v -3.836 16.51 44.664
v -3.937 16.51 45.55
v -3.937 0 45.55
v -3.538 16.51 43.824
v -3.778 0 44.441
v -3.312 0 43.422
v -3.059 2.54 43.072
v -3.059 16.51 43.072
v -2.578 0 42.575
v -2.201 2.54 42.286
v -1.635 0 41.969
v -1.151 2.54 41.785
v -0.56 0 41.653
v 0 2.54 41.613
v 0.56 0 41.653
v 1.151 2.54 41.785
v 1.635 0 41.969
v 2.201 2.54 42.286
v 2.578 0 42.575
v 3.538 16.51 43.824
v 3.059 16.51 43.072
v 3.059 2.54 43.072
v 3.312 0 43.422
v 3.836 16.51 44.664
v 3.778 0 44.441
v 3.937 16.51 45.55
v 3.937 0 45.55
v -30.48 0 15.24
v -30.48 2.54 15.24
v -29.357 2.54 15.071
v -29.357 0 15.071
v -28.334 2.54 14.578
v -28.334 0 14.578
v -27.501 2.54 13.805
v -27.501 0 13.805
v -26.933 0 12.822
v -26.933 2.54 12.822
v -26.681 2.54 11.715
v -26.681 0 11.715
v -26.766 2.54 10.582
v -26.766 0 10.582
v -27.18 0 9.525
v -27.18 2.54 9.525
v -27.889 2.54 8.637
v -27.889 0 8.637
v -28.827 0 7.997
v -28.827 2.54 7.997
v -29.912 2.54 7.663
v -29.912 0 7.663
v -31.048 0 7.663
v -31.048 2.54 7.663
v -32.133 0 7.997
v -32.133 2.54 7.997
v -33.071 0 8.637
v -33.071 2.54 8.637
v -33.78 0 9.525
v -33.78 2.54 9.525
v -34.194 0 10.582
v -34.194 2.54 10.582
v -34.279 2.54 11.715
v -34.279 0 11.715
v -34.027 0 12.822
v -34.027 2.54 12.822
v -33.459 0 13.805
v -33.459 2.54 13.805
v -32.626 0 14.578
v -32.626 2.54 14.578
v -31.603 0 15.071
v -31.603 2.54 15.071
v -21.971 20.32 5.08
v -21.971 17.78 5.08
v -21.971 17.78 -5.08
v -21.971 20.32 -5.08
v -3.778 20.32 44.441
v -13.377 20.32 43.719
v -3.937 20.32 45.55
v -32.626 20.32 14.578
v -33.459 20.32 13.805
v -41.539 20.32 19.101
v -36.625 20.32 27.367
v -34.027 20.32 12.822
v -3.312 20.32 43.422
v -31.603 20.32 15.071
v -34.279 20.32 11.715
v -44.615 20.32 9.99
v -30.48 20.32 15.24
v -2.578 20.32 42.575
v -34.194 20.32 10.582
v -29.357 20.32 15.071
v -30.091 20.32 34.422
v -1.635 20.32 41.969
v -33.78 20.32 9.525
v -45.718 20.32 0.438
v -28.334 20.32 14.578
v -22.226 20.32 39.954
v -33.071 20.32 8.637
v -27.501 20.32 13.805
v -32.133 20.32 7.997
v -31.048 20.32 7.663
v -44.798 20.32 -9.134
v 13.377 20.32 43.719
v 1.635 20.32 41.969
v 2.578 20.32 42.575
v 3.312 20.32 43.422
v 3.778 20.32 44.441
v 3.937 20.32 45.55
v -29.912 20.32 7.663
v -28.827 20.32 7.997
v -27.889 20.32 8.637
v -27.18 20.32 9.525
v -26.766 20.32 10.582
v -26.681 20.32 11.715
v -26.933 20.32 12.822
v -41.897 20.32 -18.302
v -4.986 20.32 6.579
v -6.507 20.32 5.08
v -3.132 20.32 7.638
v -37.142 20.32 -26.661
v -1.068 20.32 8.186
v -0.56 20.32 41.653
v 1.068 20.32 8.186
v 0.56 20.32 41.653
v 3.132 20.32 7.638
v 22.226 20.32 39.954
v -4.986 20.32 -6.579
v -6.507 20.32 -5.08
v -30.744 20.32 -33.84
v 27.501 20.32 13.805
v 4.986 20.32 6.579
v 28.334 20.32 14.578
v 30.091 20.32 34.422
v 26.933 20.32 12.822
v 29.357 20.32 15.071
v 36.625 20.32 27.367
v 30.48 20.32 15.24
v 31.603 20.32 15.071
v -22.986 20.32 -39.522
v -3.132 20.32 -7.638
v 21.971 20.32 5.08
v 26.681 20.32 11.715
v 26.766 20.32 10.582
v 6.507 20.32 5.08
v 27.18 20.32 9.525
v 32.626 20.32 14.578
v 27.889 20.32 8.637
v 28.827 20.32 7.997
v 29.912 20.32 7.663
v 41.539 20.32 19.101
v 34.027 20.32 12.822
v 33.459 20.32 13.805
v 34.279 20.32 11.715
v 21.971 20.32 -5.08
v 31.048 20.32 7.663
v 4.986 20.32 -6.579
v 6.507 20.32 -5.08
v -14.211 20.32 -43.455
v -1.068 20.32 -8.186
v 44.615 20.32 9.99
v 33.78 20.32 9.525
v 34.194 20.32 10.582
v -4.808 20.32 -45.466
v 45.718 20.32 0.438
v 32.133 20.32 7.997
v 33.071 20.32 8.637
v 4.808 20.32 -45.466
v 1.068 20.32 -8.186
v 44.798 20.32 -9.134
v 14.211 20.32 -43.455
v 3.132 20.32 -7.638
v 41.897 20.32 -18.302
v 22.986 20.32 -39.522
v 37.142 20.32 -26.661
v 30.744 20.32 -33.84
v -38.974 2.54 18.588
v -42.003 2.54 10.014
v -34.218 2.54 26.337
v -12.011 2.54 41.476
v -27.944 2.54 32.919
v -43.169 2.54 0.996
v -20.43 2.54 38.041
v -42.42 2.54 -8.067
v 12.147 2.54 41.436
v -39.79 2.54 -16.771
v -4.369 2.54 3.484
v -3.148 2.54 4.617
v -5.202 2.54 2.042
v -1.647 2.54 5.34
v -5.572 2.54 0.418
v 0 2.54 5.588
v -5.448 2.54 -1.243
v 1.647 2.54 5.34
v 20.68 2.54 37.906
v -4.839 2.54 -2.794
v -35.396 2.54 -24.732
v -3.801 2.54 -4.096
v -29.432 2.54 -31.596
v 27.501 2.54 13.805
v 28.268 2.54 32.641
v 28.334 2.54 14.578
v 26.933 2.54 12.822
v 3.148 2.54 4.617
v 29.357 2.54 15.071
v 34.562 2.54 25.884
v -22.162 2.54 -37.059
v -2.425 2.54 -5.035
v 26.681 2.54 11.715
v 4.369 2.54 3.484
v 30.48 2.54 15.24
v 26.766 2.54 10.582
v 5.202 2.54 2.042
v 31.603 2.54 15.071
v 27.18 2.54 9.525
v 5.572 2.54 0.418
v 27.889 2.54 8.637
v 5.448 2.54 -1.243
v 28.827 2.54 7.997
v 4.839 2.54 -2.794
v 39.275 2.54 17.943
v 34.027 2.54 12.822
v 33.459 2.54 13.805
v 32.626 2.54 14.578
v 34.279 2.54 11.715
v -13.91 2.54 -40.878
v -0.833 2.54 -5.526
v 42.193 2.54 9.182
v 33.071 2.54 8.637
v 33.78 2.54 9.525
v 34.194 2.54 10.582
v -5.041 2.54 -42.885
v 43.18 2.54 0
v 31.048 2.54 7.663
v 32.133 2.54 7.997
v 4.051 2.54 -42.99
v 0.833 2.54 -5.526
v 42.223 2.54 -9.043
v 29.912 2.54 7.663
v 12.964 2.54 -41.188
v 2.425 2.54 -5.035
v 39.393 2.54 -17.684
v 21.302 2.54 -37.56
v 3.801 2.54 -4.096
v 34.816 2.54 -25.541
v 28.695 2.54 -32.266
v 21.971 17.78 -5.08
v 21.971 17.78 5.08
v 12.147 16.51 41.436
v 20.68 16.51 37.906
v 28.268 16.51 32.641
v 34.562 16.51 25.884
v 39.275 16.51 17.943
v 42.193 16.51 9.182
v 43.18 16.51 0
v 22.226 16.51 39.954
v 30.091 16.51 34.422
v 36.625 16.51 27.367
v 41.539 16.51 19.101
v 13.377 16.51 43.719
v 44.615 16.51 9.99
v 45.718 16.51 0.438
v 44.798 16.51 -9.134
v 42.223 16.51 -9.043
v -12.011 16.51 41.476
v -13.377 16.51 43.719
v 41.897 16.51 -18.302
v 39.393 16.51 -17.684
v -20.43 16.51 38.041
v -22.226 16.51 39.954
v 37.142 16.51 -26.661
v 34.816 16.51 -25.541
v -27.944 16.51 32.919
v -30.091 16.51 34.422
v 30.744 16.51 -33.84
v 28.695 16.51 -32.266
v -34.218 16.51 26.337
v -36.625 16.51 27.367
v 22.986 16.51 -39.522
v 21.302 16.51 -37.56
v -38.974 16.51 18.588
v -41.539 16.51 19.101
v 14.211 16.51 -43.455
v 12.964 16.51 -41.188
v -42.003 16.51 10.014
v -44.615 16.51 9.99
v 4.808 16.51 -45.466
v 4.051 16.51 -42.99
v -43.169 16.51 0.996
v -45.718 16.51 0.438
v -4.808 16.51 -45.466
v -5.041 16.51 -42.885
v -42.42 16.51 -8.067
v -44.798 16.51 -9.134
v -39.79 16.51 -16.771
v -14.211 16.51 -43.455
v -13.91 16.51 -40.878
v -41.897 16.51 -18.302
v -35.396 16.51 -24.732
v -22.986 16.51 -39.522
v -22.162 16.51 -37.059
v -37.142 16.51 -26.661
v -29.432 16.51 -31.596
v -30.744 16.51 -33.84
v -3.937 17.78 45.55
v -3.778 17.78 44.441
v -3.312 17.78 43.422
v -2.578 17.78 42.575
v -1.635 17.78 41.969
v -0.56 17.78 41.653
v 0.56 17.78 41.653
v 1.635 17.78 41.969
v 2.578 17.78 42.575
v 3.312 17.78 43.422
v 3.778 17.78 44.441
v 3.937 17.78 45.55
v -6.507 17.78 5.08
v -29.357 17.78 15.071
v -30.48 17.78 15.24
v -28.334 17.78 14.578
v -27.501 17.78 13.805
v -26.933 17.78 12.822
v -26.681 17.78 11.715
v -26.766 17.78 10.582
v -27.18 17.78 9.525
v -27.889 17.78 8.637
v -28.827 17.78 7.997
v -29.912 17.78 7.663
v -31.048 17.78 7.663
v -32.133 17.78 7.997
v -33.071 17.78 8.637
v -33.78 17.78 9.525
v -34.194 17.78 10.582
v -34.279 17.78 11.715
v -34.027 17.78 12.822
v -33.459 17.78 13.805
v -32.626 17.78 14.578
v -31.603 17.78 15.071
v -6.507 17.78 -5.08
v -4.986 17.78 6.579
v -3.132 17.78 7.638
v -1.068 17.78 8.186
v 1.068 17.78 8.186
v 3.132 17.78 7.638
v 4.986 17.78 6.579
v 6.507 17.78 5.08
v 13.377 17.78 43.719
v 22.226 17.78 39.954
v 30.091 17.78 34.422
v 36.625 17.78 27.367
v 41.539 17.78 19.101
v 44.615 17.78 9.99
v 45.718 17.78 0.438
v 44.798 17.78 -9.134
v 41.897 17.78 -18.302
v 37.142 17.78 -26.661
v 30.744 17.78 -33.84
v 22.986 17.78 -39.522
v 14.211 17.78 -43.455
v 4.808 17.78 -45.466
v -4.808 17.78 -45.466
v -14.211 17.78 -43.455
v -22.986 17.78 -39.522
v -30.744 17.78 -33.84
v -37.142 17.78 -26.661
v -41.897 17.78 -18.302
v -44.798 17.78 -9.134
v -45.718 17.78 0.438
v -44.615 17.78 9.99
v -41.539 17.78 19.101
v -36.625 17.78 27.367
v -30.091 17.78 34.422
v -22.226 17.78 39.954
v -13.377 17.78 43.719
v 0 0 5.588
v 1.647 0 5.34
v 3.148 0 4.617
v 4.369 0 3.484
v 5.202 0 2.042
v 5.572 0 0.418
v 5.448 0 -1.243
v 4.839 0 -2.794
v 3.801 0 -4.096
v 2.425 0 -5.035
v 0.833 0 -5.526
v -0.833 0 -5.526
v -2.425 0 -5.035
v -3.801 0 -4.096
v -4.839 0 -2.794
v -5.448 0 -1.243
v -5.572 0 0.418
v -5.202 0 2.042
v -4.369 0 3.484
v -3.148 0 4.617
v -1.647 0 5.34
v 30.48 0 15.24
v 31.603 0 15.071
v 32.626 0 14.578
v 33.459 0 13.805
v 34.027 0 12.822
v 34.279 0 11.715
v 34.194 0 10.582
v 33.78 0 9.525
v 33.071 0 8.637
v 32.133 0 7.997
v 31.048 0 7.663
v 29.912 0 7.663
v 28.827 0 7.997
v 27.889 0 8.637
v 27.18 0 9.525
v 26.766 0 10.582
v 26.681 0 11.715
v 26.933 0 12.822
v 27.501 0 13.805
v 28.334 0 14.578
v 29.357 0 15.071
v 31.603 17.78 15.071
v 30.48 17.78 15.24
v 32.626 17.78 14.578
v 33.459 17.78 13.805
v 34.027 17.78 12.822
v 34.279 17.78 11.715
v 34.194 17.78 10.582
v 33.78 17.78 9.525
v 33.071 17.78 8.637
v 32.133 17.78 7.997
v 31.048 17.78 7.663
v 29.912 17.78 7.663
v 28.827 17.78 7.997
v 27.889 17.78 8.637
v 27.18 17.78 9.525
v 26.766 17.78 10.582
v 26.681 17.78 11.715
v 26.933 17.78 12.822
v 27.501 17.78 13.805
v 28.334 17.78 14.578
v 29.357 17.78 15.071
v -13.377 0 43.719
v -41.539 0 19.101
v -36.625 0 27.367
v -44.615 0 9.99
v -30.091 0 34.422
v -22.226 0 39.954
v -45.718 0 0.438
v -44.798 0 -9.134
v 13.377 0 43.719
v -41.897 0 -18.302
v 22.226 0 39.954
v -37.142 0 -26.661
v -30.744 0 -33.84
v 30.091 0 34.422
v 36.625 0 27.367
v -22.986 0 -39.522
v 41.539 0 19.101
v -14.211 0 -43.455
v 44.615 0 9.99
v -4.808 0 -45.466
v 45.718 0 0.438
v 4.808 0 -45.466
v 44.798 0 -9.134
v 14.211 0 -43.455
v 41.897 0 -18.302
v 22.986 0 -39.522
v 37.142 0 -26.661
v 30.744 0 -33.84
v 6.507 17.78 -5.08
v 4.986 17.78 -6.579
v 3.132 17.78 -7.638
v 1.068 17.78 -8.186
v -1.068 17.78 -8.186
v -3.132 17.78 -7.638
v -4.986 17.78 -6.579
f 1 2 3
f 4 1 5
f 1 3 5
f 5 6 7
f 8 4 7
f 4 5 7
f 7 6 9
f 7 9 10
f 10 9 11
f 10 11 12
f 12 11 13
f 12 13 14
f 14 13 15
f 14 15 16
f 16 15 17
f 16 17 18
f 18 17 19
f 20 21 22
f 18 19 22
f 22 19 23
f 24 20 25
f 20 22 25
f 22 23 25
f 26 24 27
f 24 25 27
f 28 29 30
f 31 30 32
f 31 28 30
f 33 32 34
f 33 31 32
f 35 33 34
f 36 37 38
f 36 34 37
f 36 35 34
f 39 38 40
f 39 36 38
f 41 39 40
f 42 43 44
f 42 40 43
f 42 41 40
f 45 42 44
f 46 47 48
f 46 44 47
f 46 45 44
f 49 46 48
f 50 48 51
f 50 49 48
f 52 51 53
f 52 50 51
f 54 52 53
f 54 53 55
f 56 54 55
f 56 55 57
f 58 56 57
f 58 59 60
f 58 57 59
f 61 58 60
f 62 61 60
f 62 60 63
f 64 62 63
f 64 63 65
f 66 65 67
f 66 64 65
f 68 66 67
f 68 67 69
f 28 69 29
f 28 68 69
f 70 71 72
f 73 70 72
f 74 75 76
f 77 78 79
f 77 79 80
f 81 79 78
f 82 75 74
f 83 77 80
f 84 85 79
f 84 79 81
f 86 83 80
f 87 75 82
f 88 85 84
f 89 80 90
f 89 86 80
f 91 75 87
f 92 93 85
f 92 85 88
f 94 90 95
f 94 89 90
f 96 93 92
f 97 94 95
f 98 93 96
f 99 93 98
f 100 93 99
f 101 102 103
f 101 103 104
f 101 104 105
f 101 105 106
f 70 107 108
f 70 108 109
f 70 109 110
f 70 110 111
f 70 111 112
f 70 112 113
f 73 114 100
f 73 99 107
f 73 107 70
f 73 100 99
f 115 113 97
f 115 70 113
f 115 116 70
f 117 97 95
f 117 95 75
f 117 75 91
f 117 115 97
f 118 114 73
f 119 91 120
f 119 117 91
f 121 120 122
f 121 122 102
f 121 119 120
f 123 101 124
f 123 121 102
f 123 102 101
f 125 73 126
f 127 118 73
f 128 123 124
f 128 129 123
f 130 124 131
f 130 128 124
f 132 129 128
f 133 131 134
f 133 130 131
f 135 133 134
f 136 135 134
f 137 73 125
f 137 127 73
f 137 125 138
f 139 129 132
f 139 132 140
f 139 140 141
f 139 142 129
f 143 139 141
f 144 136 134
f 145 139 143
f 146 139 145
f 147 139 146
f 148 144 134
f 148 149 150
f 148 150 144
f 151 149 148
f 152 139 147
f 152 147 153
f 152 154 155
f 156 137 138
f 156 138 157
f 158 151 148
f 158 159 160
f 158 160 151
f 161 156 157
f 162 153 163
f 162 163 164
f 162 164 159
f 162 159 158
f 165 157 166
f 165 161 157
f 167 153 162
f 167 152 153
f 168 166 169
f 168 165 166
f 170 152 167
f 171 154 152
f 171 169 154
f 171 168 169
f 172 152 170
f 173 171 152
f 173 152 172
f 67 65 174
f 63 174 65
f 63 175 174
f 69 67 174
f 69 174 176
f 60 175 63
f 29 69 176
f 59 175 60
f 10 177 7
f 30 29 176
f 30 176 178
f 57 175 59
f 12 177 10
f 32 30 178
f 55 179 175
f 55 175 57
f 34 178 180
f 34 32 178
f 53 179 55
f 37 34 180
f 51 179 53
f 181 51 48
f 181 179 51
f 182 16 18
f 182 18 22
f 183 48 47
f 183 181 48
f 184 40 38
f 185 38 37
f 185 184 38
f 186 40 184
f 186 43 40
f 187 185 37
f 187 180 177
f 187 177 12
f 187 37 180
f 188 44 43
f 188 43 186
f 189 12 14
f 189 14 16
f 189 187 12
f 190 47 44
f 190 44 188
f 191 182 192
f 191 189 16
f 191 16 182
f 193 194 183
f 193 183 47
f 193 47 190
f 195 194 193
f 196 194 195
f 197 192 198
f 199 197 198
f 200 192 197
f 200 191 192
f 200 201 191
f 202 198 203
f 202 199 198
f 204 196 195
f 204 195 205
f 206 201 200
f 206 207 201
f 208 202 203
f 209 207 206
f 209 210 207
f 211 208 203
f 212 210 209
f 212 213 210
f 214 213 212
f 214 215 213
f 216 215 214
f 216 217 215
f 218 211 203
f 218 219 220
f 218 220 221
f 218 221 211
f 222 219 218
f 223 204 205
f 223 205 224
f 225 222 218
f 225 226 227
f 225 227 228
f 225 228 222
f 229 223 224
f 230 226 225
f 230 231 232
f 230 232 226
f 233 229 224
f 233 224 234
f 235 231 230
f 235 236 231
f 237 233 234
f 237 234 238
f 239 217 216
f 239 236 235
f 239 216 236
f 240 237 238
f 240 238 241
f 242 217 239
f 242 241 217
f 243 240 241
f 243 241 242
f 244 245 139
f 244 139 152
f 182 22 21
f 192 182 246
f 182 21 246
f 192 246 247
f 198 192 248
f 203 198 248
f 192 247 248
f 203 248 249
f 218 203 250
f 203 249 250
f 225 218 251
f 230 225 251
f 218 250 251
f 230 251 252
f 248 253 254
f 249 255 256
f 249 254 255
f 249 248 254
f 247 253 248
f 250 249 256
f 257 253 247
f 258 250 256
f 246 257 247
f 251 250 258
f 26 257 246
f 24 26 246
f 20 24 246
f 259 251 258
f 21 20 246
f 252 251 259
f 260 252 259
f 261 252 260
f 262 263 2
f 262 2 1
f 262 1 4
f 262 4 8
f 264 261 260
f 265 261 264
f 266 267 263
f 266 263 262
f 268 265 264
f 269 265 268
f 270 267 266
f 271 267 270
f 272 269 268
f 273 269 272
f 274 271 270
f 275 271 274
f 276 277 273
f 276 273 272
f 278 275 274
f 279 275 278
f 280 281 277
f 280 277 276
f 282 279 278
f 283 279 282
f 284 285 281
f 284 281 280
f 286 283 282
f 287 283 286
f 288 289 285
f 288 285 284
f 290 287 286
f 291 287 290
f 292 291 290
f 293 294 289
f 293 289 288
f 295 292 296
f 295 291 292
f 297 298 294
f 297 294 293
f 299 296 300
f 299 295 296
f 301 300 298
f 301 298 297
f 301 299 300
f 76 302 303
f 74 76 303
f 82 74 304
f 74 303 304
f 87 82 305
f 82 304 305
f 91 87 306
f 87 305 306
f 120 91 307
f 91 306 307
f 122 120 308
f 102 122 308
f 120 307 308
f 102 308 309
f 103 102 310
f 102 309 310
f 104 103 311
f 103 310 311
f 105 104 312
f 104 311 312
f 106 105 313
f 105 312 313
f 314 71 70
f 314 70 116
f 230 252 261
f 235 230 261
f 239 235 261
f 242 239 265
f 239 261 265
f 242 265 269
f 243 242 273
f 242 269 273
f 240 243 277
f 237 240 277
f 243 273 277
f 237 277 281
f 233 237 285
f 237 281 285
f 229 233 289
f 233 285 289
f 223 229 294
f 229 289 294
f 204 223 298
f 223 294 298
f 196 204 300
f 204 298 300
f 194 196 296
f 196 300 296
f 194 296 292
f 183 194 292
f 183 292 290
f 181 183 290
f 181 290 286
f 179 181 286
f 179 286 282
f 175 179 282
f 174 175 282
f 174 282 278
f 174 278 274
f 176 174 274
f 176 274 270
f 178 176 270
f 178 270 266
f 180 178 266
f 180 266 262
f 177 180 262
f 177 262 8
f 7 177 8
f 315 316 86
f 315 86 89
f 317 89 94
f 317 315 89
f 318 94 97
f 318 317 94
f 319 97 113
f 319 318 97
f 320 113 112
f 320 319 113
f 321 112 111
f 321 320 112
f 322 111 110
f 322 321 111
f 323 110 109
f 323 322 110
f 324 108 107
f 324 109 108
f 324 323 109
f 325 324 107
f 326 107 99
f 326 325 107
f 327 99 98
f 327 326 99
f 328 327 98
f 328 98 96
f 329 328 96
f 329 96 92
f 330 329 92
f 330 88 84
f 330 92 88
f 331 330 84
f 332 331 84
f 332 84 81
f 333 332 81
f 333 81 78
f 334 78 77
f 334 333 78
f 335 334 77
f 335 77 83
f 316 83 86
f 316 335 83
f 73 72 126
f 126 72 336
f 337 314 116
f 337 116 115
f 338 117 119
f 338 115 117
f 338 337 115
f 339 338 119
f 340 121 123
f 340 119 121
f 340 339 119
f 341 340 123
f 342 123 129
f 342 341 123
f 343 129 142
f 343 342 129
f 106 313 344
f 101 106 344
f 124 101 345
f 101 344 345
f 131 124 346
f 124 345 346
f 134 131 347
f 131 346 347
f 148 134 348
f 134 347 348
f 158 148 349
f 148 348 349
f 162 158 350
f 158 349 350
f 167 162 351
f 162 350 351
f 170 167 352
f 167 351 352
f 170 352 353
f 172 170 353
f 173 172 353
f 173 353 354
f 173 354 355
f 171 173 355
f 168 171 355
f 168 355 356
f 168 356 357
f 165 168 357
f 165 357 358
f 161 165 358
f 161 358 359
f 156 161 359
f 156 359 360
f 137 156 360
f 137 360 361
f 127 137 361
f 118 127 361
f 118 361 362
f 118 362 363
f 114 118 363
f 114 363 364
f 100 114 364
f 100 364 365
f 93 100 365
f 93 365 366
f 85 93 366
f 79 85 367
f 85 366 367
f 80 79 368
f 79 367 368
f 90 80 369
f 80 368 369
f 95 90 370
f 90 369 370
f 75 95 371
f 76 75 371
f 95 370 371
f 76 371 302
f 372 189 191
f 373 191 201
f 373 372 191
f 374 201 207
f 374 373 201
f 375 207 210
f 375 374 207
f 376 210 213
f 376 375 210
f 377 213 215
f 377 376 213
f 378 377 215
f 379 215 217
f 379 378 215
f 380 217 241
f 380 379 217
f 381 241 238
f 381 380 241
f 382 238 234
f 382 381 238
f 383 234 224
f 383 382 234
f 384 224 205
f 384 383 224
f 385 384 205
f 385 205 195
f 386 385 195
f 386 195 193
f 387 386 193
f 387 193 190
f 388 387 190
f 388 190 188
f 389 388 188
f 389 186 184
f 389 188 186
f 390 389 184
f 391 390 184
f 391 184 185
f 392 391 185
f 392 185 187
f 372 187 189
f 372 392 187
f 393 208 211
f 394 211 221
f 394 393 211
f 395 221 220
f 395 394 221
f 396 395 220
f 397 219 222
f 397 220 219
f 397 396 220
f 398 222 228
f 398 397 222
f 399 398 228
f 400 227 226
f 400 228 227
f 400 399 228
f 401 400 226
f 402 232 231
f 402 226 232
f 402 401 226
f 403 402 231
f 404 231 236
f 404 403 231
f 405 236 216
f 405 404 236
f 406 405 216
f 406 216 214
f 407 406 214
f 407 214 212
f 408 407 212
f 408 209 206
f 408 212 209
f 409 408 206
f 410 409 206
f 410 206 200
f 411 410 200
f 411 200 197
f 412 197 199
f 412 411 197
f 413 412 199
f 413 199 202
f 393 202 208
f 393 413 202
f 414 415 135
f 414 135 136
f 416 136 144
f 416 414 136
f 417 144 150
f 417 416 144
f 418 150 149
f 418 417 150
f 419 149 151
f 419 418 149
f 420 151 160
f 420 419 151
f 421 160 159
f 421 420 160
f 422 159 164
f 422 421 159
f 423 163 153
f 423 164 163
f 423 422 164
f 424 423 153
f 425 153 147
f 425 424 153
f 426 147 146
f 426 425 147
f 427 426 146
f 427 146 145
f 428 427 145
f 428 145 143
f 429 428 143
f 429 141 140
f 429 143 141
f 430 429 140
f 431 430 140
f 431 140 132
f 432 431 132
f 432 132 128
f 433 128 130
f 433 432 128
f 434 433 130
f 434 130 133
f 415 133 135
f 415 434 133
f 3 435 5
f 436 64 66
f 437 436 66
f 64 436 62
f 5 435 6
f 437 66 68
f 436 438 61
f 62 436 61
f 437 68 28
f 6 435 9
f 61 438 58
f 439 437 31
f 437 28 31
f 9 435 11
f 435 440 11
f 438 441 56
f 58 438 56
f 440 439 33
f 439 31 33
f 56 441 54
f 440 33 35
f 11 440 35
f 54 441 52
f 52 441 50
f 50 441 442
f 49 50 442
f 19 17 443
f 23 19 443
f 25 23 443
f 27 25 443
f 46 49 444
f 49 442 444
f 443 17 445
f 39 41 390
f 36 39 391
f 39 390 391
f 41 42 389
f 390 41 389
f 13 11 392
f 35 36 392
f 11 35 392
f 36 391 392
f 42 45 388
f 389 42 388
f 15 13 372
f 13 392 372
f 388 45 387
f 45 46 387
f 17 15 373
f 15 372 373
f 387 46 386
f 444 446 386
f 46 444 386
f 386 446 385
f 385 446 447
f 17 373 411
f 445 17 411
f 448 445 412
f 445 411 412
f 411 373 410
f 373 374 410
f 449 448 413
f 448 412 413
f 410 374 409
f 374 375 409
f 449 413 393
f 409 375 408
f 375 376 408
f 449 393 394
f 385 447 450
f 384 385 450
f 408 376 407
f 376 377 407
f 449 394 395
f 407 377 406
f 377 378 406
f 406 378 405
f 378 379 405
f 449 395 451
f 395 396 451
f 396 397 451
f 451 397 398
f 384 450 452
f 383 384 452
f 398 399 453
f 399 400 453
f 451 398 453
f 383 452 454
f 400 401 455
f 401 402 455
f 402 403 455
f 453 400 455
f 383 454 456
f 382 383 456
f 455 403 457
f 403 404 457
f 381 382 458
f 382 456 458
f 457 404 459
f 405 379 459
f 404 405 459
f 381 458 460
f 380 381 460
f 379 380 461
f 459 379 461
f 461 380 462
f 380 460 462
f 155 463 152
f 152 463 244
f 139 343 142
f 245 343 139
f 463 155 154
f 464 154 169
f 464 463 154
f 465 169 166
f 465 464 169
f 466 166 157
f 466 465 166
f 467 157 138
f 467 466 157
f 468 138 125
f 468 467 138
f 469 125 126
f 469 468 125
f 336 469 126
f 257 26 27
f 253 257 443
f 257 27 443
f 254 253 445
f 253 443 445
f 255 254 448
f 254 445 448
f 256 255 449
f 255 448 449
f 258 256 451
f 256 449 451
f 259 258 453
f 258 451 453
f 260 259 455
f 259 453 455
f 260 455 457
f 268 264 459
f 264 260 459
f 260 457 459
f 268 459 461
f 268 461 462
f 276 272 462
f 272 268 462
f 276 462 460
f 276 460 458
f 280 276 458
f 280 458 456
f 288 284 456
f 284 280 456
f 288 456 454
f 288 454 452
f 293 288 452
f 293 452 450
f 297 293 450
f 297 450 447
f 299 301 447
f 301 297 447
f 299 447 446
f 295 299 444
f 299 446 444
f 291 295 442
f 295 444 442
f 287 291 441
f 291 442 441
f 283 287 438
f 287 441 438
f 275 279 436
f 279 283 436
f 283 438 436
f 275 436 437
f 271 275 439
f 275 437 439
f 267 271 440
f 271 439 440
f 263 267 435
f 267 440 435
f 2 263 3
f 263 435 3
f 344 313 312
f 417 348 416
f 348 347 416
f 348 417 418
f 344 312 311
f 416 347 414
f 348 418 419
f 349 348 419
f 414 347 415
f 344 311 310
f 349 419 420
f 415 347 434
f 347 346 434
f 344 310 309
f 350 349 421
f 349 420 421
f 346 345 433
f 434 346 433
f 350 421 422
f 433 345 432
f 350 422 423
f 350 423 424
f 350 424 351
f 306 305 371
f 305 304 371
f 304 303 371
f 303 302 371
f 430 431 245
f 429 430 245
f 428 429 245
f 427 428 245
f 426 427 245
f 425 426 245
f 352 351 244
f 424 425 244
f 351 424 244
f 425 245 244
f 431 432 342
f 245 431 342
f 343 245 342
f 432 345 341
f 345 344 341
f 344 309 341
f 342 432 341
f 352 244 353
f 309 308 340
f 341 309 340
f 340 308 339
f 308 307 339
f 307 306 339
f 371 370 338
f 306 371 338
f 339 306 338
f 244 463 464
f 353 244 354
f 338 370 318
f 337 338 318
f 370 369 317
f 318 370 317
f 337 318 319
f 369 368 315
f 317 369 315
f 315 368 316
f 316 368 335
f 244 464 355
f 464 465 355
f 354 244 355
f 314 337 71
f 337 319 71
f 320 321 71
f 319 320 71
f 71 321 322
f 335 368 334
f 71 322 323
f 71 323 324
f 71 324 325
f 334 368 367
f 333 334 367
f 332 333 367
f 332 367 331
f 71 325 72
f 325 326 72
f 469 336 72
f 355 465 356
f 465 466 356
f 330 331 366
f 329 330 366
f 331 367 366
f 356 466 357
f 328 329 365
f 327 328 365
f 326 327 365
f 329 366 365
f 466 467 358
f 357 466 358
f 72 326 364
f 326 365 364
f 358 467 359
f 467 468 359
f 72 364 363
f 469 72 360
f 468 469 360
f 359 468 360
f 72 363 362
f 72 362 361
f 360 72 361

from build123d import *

# Parameters (mm, degrees)
SKETCH1_R               = 5.588
BOSS_EXTRUDE1_DEPTH     = 20.32
CUT_EXTRUDE5_START      = 2.54
SKETCH5_R               = 8.255
CUT_EXTRUDE5_DEPTH      = 47.498
CUT_EXTRUDE7_START      = 17.78
SKETCH6_R               = 43.18
CUT_EXTRUDE7_DEPTH      = 15.24
CUT_EXTRUDE8_START      = 10.16
SKETCH7_W               = 43.942
SKETCH7_H               = 10.16
CUT_EXTRUDE8_DEPTH      = 28.448
CUT_EXTRUDE9_DEPTH      = 72.898
CUT_EXTRUDE9_DEPTH_BACK = 70.612
SKETCH8_W               = 108.573094023
SKETCH8_H               = 1.27
SKETCH9_R               = 3.81
CUT_EXTRUDE10_DEPTH     = 39.37


with BuildPart() as part:
    # Sketch1 → Boss-Extrude1 (new body)
    with BuildSketch(Plane(origin=(0, 0, 0), x_dir=(1, 0, 0), z_dir=(0, 1, 0))):
        with BuildLine():
            ThreePointArc((3.937, -45.550174873), (0, 45.72), (-3.937, -45.550174873))
            ThreePointArc((-3.937, -45.550174873), (0, -41.613174873), (3.937, -45.550174873))
        make_face()
        with Locations(Location((0, 0, 0), (0, 0, 270))):
            Circle(SKETCH1_R, mode=Mode.SUBTRACT)
    extrude(amount=BOSS_EXTRUDE1_DEPTH)

    # Sketch5 → Cut-Extrude5 (cut)
    with BuildSketch(Plane(origin=(0, 0, 0), x_dir=(1, 0, 0), z_dir=(0, 1, 0)).offset(CUT_EXTRUDE5_START)):
        with Locations(Location((0, 0, 0), (0, 0, 90))):
            Circle(SKETCH5_R)
    extrude(amount=CUT_EXTRUDE5_DEPTH, mode=Mode.SUBTRACT)

    # Sketch6 → Cut-Extrude7 (cut)
    with BuildSketch(Plane(origin=(0, 0, 0), x_dir=(1, 0, 0), z_dir=(0, 1, 0)).offset(CUT_EXTRUDE7_START)):
        Circle(SKETCH6_R)
    extrude(amount=-CUT_EXTRUDE7_DEPTH, mode=Mode.SUBTRACT)

    # Sketch7 → Cut-Extrude8 (cut)
    with BuildSketch(Plane(origin=(0, 0, 0), x_dir=(1, 0, 0), z_dir=(0, 1, 0)).offset(CUT_EXTRUDE8_START)):
        Rectangle(SKETCH7_W, SKETCH7_H)
    extrude(amount=CUT_EXTRUDE8_DEPTH, mode=Mode.SUBTRACT)

    # Sketch8 → Cut-Extrude9 (cut, two sides: drawn at the far end of the back side and taken through both)
    with BuildSketch(Plane(origin=(0, 0, 0), x_dir=(0, 0, -1), z_dir=(1, 0, 0)).offset(-CUT_EXTRUDE9_DEPTH_BACK)):
        with Locations((1.451126255, 17.145)):
            Rectangle(SKETCH8_W, SKETCH8_H)
    extrude(amount=CUT_EXTRUDE9_DEPTH + CUT_EXTRUDE9_DEPTH_BACK, mode=Mode.SUBTRACT)


with BuildPart() as cut_extrude9_piece_1:
    # of the separate pieces the step leaves, piece 1, a body of its own (cut_extrude9_pieces)
    add(part.part.solids().sort_by_distance((-3.937, 0, 45.550174873))[0])


with BuildPart() as cut_extrude9_piece_2:
    # of the separate pieces the step leaves, piece 2, a body of its own (cut_extrude9_pieces)
    add(part.part.solids().sort_by_distance((-3.937, 17.78, 45.550174873))[0])


with BuildPart() as cut_extrude10_tool:
    # Sketch9 → Cut-Extrude10 (new body)
    with BuildSketch(Plane(origin=(0, 0, 0), x_dir=(1, 0, 0), z_dir=(0, 1, 0))):
        with Locations(Location((-30.48, -11.43, 0), (0, 0, 270))):
            Circle(SKETCH9_R)
        with Locations(Location((30.48, -11.43, 0), (0, 0, 270))):
            Circle(SKETCH9_R)
    extrude(amount=CUT_EXTRUDE10_DEPTH)


with BuildPart() as cut_extrude9_piece_1_1:
    add(cut_extrude9_piece_1.part)

    # Cut-Extrude10: cut by cut_extrude10_tool
    add(cut_extrude10_tool.part, mode=Mode.SUBTRACT)


with BuildPart() as cut_extrude9_piece_2_1:
    add(cut_extrude9_piece_2.part)

    # Cut-Extrude10: cut by cut_extrude10_tool
    add(cut_extrude10_tool.part, mode=Mode.SUBTRACT)


solid = Compound([cut_extrude9_piece_1_1.part, cut_extrude9_piece_2_1.part])
